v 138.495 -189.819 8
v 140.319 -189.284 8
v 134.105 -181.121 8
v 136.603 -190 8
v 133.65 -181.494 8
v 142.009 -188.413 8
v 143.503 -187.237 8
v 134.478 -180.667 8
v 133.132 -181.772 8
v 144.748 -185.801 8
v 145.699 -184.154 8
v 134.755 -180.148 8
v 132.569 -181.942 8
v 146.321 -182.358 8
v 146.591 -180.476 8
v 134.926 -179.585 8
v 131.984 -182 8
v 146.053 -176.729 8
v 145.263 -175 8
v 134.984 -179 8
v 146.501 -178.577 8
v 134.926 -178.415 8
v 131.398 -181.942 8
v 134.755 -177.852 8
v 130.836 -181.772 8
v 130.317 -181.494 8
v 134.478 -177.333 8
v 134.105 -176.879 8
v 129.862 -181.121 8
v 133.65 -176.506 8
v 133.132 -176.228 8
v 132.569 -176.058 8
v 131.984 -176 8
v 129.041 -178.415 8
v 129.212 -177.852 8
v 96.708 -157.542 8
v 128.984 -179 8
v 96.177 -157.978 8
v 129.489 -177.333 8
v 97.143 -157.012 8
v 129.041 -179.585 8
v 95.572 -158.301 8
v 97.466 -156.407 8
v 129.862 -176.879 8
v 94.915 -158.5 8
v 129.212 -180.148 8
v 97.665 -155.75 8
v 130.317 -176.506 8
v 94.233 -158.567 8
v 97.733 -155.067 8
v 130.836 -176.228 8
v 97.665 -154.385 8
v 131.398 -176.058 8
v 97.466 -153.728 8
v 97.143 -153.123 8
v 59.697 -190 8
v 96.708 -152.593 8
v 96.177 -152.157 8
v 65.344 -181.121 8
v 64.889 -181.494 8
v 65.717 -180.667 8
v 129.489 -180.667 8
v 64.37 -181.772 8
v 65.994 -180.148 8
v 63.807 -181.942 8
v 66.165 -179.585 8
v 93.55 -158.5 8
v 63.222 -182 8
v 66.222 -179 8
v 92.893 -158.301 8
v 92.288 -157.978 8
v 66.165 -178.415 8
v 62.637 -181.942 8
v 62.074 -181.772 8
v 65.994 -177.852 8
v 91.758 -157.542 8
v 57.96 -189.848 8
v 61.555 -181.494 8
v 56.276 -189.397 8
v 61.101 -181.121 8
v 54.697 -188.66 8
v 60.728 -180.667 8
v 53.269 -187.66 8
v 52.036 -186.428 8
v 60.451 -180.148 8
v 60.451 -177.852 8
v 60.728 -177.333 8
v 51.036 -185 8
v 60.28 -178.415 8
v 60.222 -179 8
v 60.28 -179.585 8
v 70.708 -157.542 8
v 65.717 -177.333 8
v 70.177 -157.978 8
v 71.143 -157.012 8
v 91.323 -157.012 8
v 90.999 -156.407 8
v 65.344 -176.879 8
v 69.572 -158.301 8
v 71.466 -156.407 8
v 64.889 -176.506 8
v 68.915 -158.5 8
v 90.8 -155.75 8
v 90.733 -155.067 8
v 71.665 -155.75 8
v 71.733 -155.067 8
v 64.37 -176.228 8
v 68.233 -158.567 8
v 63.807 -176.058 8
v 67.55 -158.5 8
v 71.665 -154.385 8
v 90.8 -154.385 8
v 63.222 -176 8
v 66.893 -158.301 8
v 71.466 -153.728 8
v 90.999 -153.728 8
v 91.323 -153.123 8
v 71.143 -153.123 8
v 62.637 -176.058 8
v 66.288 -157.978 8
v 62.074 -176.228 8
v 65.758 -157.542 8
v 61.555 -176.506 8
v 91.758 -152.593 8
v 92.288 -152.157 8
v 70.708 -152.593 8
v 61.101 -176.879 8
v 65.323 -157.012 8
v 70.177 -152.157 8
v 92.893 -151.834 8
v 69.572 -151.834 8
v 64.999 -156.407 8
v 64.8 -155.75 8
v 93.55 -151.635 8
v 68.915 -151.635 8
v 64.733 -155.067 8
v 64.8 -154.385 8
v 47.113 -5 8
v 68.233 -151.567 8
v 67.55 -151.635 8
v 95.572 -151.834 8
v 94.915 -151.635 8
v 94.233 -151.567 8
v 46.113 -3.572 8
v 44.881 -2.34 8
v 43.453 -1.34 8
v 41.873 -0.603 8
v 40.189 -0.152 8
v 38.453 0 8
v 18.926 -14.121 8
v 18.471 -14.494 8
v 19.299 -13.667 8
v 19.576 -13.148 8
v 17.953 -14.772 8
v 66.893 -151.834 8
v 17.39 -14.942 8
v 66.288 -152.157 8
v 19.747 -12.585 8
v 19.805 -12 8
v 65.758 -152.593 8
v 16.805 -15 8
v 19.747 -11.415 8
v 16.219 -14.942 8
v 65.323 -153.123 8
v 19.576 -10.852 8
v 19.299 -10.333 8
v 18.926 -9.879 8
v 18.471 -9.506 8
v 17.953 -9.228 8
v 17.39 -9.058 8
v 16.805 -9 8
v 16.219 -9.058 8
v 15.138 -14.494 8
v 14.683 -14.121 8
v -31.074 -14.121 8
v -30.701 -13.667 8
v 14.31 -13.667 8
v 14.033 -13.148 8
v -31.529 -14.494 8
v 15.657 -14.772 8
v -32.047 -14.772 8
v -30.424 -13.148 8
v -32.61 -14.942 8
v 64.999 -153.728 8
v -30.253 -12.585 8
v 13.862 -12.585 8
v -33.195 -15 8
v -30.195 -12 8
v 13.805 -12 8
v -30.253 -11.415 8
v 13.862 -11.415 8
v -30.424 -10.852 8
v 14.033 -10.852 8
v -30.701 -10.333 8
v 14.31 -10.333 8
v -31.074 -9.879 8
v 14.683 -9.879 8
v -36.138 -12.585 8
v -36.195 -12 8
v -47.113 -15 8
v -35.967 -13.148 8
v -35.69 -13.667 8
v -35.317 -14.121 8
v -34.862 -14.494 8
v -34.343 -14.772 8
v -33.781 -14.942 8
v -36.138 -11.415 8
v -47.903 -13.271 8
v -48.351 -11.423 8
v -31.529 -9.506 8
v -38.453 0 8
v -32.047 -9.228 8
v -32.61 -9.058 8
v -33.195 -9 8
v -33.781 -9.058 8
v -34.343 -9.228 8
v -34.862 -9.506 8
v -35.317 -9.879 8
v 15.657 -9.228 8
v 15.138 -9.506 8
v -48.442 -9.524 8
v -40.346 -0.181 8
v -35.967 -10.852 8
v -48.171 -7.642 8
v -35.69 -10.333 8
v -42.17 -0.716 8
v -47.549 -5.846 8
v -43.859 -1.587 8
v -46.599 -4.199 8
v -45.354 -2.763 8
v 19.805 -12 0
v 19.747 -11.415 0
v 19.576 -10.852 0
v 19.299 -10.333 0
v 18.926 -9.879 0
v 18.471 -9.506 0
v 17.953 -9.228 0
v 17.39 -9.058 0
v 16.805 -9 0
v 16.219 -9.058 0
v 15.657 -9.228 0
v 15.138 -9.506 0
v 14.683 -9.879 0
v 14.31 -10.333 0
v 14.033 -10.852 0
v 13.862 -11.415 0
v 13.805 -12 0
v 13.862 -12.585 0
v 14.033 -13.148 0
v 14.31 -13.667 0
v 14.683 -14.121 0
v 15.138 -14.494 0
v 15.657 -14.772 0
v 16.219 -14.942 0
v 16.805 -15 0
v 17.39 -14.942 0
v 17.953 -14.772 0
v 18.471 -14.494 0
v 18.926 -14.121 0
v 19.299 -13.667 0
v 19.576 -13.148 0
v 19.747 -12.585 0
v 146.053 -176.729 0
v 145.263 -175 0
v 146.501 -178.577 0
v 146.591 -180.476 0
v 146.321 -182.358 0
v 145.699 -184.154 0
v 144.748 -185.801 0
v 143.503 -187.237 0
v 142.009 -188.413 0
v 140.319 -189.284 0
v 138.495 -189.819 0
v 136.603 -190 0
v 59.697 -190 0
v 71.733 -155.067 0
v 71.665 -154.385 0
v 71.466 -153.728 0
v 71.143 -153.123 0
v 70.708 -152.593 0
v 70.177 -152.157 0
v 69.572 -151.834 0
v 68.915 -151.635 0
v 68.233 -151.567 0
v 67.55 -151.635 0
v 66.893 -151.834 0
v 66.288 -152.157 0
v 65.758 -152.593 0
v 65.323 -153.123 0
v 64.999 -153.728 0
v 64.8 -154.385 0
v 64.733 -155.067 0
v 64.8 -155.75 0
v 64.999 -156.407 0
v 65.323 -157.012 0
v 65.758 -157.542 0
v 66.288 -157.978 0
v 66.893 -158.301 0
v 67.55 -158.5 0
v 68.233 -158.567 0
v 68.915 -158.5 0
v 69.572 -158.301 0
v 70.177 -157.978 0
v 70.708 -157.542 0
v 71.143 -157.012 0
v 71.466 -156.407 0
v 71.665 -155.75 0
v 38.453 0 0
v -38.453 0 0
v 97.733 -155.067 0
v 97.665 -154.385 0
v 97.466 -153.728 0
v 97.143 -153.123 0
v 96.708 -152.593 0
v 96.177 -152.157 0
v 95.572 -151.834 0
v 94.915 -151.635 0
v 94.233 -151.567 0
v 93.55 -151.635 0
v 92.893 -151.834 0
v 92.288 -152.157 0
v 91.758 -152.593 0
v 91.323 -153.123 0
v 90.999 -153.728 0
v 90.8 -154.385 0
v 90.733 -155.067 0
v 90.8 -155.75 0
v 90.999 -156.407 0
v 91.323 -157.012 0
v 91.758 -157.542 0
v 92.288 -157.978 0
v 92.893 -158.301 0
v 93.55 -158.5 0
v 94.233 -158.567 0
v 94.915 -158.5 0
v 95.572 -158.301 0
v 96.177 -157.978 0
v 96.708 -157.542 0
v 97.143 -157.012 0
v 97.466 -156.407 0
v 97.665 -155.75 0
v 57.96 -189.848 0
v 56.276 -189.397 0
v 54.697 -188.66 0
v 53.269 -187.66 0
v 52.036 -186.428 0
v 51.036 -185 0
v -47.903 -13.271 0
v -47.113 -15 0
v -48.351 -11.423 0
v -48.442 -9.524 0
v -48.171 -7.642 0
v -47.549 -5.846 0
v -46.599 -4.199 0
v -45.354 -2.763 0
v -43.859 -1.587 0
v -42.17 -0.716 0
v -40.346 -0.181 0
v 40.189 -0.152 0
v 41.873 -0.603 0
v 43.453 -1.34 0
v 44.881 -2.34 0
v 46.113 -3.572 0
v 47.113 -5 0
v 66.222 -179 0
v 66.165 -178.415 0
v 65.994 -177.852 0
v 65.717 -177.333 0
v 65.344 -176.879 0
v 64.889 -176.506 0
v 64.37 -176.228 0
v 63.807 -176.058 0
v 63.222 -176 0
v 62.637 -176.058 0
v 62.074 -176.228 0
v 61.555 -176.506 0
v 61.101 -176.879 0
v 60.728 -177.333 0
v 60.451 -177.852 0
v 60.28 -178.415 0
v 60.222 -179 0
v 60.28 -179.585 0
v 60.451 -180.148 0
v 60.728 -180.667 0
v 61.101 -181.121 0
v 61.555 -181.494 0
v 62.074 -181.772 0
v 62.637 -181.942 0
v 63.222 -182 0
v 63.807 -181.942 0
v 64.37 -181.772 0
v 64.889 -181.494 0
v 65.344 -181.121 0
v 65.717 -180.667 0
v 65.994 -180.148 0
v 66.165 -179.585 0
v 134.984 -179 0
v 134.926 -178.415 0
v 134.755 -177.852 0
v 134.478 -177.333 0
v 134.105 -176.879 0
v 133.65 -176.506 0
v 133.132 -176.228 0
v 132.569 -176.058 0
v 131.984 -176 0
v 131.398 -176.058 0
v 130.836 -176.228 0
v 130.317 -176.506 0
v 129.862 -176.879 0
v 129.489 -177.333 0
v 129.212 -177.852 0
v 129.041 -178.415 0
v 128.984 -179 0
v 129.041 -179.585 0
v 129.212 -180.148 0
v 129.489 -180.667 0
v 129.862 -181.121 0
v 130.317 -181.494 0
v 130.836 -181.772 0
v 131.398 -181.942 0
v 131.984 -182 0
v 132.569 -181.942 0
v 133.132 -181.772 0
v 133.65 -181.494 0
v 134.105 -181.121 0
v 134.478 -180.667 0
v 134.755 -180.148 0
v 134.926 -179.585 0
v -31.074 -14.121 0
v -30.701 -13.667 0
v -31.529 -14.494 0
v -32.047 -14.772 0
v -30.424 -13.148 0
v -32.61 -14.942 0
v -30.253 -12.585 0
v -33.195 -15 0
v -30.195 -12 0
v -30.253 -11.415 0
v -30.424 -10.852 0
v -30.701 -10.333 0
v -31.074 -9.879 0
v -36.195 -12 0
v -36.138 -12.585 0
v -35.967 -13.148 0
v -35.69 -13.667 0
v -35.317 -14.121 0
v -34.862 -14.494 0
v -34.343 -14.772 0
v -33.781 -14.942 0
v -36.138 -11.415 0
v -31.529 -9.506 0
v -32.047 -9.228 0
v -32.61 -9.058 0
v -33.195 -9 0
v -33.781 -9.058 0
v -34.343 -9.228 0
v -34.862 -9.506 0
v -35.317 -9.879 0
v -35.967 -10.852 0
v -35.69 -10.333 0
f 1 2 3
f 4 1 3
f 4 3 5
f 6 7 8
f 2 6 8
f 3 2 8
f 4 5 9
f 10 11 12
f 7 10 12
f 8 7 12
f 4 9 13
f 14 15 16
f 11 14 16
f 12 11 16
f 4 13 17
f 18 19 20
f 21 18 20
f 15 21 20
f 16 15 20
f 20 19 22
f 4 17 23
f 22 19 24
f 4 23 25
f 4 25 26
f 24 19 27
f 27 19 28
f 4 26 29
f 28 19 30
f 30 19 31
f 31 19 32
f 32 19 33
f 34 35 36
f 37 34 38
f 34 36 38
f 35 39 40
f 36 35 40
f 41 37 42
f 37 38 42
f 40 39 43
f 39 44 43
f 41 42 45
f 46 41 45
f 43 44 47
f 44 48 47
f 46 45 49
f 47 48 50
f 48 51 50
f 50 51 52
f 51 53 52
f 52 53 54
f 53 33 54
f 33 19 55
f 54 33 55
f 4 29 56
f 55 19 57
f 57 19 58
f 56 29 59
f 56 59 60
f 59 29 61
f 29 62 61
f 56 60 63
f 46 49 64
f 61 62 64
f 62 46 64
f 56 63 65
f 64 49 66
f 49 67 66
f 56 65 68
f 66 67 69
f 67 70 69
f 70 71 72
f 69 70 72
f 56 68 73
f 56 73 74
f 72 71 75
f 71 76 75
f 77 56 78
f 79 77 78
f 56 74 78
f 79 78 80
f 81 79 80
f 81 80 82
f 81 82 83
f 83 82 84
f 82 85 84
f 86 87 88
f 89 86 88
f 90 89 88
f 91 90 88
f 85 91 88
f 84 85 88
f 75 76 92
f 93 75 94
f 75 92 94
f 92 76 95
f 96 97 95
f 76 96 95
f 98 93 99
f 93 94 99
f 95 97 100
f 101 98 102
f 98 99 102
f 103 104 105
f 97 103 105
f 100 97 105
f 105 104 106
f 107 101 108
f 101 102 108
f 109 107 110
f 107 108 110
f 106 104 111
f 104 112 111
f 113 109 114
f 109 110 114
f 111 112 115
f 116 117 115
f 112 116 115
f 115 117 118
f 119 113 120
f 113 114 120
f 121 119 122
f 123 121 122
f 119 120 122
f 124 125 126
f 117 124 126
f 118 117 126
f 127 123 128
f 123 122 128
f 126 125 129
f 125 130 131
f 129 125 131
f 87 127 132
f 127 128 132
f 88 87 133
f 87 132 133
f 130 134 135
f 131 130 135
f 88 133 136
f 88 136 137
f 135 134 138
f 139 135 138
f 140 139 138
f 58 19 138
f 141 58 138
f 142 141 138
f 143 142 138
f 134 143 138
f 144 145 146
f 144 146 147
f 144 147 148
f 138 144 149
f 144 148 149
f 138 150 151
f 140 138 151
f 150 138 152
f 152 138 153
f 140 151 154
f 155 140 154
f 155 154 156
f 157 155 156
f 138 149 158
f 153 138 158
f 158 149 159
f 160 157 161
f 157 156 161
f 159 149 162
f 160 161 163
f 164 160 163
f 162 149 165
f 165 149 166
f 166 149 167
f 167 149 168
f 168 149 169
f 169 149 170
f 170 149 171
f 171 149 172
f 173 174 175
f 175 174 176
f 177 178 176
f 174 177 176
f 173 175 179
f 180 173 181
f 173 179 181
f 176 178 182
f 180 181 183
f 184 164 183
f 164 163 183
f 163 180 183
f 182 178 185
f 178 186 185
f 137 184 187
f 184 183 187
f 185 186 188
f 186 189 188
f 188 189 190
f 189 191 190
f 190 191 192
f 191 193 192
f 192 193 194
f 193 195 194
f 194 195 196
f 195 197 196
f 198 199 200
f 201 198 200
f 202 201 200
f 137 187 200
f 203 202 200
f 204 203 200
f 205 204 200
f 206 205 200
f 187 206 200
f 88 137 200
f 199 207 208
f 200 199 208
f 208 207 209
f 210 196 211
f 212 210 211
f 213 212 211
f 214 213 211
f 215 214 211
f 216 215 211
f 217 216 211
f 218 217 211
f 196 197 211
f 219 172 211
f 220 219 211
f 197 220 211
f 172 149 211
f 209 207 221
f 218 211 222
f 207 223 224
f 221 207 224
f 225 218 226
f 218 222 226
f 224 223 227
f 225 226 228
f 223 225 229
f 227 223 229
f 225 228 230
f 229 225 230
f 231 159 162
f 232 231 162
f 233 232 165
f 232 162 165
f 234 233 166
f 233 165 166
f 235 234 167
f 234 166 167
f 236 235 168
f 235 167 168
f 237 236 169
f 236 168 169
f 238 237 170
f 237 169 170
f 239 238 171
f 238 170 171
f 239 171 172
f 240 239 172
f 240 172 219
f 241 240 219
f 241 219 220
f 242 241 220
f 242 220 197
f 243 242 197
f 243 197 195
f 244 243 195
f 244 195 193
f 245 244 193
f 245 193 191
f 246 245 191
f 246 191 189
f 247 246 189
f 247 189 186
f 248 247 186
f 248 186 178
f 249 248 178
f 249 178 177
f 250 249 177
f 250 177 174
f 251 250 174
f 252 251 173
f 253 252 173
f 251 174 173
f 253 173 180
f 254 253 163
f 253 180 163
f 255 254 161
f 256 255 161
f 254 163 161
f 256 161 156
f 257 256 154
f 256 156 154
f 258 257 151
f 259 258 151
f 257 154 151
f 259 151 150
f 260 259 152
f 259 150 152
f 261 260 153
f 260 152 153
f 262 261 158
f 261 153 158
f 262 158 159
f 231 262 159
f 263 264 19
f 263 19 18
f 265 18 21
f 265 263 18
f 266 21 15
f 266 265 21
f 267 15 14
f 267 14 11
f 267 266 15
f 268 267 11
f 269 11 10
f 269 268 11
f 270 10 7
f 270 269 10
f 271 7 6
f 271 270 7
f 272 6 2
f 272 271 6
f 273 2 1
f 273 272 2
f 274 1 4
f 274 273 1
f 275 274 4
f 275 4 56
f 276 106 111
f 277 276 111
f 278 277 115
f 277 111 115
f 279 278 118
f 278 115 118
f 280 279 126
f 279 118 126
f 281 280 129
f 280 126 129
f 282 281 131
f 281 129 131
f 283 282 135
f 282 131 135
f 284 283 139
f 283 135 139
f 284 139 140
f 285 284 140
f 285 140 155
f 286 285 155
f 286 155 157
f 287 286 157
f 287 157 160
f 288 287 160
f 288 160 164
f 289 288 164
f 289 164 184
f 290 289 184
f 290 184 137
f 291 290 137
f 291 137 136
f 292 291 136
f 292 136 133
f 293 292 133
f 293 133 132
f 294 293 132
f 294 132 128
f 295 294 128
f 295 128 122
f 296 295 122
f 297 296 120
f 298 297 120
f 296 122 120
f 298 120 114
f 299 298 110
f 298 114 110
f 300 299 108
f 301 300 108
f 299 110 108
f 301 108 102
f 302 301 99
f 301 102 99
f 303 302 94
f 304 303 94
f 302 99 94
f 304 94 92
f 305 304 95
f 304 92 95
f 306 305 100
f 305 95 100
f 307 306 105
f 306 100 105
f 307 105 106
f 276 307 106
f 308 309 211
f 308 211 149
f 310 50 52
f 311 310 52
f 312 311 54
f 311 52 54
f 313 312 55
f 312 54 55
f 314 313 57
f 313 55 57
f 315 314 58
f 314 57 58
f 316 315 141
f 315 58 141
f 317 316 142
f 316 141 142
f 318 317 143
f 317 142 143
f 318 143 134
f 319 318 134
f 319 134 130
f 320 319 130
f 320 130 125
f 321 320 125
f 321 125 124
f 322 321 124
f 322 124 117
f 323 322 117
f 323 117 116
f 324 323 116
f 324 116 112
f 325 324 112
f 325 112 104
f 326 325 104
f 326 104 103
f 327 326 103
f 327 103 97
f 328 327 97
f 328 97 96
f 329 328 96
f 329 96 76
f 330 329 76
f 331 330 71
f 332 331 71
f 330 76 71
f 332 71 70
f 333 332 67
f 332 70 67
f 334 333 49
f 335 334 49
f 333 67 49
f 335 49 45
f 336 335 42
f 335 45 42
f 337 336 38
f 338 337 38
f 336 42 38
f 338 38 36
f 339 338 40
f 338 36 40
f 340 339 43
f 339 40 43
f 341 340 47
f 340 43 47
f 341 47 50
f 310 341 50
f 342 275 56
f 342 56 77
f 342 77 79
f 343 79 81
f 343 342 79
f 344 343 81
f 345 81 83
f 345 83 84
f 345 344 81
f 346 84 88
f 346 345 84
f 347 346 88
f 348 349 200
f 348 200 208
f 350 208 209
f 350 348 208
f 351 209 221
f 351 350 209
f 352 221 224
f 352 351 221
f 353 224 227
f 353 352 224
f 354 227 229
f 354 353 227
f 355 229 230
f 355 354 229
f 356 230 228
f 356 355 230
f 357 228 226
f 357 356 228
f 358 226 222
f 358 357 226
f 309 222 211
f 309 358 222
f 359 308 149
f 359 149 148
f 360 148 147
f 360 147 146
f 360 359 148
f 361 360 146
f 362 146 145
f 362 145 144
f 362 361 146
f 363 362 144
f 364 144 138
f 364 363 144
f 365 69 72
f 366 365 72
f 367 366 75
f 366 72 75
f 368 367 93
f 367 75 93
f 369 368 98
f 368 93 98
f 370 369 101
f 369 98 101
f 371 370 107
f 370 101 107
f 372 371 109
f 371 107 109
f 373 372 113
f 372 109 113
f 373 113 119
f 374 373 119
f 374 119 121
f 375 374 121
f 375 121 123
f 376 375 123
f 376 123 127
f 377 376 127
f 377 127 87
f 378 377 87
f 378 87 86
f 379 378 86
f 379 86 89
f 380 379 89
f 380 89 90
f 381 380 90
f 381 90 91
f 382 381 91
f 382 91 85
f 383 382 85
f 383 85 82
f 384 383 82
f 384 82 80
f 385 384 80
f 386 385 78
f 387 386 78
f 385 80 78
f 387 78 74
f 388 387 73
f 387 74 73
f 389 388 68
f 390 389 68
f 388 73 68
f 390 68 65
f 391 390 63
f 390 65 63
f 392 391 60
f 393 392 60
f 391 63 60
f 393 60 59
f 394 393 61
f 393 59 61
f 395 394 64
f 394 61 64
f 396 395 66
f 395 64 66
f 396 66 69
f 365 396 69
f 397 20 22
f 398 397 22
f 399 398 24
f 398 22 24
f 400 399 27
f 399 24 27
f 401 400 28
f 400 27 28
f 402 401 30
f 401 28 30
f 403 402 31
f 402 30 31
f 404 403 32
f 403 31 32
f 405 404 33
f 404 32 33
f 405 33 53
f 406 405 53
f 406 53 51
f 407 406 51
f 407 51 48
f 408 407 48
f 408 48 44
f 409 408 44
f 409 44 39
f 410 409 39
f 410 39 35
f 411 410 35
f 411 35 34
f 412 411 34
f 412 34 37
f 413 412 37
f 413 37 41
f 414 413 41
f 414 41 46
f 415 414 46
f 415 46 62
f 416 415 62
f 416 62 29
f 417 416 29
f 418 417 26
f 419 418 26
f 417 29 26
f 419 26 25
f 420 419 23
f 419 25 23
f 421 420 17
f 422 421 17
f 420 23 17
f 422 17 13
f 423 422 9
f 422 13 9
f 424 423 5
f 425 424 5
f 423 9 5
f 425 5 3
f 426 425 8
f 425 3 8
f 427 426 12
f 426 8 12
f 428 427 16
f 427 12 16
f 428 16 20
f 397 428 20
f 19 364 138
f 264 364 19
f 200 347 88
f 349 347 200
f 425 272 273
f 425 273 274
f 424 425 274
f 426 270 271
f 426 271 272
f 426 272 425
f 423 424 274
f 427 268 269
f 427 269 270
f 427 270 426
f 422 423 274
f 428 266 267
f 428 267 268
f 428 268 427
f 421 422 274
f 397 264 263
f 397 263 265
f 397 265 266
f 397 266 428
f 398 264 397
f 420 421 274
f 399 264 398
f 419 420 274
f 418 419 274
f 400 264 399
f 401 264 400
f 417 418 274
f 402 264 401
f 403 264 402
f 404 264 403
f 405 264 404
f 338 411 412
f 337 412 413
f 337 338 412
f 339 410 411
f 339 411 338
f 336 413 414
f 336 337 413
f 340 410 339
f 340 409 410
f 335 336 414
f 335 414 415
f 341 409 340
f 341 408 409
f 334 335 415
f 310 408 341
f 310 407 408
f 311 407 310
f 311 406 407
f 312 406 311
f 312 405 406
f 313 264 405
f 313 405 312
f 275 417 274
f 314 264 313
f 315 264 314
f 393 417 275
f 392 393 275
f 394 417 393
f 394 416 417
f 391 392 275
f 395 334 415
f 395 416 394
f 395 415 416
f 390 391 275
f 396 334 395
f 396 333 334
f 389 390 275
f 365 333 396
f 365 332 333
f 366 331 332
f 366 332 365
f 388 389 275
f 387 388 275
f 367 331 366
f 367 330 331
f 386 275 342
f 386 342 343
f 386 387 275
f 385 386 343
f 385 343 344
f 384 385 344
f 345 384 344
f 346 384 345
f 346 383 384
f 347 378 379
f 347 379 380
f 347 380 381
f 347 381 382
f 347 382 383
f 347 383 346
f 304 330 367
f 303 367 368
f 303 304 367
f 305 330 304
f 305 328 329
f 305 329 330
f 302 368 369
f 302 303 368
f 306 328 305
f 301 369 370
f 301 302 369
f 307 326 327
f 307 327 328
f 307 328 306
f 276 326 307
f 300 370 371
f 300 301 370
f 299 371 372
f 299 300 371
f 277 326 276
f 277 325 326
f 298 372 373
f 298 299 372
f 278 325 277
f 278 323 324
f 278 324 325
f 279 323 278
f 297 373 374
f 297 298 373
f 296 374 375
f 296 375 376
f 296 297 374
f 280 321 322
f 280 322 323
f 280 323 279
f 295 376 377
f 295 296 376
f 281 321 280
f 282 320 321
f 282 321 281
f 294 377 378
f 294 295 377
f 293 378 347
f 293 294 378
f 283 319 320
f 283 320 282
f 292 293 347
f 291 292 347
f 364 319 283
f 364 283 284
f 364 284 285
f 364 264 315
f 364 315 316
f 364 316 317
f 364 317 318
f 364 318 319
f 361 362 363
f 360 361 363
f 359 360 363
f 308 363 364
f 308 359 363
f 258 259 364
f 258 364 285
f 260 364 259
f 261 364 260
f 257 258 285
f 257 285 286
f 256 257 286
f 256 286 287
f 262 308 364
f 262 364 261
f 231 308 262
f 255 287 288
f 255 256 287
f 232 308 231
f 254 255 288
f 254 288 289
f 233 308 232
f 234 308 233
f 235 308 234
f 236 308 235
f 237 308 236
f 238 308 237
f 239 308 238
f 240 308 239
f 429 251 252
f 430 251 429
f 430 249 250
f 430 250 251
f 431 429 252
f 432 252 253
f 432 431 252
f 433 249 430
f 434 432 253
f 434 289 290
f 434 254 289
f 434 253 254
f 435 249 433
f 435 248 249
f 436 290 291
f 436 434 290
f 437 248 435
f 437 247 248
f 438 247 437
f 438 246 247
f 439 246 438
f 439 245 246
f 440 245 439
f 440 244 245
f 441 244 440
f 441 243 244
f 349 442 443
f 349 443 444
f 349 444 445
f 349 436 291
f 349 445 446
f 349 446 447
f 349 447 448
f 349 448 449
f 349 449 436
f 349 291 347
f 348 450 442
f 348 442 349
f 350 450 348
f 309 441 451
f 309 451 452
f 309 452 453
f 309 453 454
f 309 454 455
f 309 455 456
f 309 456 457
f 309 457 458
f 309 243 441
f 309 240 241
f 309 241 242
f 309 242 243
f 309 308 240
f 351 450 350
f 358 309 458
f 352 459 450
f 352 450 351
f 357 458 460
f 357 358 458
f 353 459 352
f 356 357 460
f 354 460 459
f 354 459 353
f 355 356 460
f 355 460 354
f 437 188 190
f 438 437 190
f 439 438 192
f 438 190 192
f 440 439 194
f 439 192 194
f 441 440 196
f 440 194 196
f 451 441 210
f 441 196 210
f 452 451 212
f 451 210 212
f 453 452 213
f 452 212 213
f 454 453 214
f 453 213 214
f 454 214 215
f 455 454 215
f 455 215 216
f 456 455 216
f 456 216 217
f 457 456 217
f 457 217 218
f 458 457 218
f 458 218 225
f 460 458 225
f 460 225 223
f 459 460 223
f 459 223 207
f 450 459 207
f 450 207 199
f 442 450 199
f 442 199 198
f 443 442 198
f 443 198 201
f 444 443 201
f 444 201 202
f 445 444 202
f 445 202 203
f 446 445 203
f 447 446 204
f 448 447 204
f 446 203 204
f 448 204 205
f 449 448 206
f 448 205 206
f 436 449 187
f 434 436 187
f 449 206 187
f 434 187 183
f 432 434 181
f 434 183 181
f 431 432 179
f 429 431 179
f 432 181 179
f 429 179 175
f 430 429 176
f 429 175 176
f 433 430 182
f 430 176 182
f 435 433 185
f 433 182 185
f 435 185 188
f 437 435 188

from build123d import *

# Parameters (mm, degrees)
BOSS_EXTRU_1_DEPTH      = 8
ESQUISSE2_R             = 3
ESQUISSE2_R_2           = 3.5
ENL_V_MAT_EXTRU_1_DEPTH = 644.25917494


with BuildPart() as part:
    # Esquisse1 → Boss.-Extru.1 (new body)
    with BuildSketch(Plane.XY):
        with BuildLine():
            Line((-38.452994616, 0), (38.452994616, 0))
            ThreePointArc((38.452994616, 0), (43.452994616, -1.339745962), (47.113248654, -5))
            Line((47.113248654, -5), (145.262794416, -175))
            ThreePointArc((145.262794416, -175), (145.262794416, -185), (136.602540378, -190))
            Line((136.602540378, -190), (59.696551146, -190))
            ThreePointArc((59.696551146, -190), (54.696551146, -188.660254038), (51.036297108, -185))
            Line((51.036297108, -185), (-47.113248654, -15))
            ThreePointArc((-47.113248654, -15), (-47.113248654, -5), (-38.452994616, 0))
        make_face()
    extrude(amount=BOSS_EXTRU_1_DEPTH)

    # Esquisse2 → Enlèv. mat.-Extru.1 (cut, through all)
    with BuildSketch(Plane(origin=(81.232648941, -630, 8), x_dir=(1, 0, 0), z_dir=(0, 0, 1))):
        with Locations((-114.42794679, 618)):
            Circle(ESQUISSE2_R)
        with Locations((-64.42794679, 618)):
            Circle(ESQUISSE2_R)
        with Locations((-13, 474.932525236)):
            Circle(ESQUISSE2_R_2)
        with Locations((13, 474.932525236)):
            Circle(ESQUISSE2_R_2)
        with Locations((-18.010451836, 451)):
            Circle(ESQUISSE2_R)
        with Locations((50.751089284, 451)):
            Circle(ESQUISSE2_R)
    extrude(amount=-ENL_V_MAT_EXTRU_1_DEPTH, mode=Mode.SUBTRACT)


solid = part.part
